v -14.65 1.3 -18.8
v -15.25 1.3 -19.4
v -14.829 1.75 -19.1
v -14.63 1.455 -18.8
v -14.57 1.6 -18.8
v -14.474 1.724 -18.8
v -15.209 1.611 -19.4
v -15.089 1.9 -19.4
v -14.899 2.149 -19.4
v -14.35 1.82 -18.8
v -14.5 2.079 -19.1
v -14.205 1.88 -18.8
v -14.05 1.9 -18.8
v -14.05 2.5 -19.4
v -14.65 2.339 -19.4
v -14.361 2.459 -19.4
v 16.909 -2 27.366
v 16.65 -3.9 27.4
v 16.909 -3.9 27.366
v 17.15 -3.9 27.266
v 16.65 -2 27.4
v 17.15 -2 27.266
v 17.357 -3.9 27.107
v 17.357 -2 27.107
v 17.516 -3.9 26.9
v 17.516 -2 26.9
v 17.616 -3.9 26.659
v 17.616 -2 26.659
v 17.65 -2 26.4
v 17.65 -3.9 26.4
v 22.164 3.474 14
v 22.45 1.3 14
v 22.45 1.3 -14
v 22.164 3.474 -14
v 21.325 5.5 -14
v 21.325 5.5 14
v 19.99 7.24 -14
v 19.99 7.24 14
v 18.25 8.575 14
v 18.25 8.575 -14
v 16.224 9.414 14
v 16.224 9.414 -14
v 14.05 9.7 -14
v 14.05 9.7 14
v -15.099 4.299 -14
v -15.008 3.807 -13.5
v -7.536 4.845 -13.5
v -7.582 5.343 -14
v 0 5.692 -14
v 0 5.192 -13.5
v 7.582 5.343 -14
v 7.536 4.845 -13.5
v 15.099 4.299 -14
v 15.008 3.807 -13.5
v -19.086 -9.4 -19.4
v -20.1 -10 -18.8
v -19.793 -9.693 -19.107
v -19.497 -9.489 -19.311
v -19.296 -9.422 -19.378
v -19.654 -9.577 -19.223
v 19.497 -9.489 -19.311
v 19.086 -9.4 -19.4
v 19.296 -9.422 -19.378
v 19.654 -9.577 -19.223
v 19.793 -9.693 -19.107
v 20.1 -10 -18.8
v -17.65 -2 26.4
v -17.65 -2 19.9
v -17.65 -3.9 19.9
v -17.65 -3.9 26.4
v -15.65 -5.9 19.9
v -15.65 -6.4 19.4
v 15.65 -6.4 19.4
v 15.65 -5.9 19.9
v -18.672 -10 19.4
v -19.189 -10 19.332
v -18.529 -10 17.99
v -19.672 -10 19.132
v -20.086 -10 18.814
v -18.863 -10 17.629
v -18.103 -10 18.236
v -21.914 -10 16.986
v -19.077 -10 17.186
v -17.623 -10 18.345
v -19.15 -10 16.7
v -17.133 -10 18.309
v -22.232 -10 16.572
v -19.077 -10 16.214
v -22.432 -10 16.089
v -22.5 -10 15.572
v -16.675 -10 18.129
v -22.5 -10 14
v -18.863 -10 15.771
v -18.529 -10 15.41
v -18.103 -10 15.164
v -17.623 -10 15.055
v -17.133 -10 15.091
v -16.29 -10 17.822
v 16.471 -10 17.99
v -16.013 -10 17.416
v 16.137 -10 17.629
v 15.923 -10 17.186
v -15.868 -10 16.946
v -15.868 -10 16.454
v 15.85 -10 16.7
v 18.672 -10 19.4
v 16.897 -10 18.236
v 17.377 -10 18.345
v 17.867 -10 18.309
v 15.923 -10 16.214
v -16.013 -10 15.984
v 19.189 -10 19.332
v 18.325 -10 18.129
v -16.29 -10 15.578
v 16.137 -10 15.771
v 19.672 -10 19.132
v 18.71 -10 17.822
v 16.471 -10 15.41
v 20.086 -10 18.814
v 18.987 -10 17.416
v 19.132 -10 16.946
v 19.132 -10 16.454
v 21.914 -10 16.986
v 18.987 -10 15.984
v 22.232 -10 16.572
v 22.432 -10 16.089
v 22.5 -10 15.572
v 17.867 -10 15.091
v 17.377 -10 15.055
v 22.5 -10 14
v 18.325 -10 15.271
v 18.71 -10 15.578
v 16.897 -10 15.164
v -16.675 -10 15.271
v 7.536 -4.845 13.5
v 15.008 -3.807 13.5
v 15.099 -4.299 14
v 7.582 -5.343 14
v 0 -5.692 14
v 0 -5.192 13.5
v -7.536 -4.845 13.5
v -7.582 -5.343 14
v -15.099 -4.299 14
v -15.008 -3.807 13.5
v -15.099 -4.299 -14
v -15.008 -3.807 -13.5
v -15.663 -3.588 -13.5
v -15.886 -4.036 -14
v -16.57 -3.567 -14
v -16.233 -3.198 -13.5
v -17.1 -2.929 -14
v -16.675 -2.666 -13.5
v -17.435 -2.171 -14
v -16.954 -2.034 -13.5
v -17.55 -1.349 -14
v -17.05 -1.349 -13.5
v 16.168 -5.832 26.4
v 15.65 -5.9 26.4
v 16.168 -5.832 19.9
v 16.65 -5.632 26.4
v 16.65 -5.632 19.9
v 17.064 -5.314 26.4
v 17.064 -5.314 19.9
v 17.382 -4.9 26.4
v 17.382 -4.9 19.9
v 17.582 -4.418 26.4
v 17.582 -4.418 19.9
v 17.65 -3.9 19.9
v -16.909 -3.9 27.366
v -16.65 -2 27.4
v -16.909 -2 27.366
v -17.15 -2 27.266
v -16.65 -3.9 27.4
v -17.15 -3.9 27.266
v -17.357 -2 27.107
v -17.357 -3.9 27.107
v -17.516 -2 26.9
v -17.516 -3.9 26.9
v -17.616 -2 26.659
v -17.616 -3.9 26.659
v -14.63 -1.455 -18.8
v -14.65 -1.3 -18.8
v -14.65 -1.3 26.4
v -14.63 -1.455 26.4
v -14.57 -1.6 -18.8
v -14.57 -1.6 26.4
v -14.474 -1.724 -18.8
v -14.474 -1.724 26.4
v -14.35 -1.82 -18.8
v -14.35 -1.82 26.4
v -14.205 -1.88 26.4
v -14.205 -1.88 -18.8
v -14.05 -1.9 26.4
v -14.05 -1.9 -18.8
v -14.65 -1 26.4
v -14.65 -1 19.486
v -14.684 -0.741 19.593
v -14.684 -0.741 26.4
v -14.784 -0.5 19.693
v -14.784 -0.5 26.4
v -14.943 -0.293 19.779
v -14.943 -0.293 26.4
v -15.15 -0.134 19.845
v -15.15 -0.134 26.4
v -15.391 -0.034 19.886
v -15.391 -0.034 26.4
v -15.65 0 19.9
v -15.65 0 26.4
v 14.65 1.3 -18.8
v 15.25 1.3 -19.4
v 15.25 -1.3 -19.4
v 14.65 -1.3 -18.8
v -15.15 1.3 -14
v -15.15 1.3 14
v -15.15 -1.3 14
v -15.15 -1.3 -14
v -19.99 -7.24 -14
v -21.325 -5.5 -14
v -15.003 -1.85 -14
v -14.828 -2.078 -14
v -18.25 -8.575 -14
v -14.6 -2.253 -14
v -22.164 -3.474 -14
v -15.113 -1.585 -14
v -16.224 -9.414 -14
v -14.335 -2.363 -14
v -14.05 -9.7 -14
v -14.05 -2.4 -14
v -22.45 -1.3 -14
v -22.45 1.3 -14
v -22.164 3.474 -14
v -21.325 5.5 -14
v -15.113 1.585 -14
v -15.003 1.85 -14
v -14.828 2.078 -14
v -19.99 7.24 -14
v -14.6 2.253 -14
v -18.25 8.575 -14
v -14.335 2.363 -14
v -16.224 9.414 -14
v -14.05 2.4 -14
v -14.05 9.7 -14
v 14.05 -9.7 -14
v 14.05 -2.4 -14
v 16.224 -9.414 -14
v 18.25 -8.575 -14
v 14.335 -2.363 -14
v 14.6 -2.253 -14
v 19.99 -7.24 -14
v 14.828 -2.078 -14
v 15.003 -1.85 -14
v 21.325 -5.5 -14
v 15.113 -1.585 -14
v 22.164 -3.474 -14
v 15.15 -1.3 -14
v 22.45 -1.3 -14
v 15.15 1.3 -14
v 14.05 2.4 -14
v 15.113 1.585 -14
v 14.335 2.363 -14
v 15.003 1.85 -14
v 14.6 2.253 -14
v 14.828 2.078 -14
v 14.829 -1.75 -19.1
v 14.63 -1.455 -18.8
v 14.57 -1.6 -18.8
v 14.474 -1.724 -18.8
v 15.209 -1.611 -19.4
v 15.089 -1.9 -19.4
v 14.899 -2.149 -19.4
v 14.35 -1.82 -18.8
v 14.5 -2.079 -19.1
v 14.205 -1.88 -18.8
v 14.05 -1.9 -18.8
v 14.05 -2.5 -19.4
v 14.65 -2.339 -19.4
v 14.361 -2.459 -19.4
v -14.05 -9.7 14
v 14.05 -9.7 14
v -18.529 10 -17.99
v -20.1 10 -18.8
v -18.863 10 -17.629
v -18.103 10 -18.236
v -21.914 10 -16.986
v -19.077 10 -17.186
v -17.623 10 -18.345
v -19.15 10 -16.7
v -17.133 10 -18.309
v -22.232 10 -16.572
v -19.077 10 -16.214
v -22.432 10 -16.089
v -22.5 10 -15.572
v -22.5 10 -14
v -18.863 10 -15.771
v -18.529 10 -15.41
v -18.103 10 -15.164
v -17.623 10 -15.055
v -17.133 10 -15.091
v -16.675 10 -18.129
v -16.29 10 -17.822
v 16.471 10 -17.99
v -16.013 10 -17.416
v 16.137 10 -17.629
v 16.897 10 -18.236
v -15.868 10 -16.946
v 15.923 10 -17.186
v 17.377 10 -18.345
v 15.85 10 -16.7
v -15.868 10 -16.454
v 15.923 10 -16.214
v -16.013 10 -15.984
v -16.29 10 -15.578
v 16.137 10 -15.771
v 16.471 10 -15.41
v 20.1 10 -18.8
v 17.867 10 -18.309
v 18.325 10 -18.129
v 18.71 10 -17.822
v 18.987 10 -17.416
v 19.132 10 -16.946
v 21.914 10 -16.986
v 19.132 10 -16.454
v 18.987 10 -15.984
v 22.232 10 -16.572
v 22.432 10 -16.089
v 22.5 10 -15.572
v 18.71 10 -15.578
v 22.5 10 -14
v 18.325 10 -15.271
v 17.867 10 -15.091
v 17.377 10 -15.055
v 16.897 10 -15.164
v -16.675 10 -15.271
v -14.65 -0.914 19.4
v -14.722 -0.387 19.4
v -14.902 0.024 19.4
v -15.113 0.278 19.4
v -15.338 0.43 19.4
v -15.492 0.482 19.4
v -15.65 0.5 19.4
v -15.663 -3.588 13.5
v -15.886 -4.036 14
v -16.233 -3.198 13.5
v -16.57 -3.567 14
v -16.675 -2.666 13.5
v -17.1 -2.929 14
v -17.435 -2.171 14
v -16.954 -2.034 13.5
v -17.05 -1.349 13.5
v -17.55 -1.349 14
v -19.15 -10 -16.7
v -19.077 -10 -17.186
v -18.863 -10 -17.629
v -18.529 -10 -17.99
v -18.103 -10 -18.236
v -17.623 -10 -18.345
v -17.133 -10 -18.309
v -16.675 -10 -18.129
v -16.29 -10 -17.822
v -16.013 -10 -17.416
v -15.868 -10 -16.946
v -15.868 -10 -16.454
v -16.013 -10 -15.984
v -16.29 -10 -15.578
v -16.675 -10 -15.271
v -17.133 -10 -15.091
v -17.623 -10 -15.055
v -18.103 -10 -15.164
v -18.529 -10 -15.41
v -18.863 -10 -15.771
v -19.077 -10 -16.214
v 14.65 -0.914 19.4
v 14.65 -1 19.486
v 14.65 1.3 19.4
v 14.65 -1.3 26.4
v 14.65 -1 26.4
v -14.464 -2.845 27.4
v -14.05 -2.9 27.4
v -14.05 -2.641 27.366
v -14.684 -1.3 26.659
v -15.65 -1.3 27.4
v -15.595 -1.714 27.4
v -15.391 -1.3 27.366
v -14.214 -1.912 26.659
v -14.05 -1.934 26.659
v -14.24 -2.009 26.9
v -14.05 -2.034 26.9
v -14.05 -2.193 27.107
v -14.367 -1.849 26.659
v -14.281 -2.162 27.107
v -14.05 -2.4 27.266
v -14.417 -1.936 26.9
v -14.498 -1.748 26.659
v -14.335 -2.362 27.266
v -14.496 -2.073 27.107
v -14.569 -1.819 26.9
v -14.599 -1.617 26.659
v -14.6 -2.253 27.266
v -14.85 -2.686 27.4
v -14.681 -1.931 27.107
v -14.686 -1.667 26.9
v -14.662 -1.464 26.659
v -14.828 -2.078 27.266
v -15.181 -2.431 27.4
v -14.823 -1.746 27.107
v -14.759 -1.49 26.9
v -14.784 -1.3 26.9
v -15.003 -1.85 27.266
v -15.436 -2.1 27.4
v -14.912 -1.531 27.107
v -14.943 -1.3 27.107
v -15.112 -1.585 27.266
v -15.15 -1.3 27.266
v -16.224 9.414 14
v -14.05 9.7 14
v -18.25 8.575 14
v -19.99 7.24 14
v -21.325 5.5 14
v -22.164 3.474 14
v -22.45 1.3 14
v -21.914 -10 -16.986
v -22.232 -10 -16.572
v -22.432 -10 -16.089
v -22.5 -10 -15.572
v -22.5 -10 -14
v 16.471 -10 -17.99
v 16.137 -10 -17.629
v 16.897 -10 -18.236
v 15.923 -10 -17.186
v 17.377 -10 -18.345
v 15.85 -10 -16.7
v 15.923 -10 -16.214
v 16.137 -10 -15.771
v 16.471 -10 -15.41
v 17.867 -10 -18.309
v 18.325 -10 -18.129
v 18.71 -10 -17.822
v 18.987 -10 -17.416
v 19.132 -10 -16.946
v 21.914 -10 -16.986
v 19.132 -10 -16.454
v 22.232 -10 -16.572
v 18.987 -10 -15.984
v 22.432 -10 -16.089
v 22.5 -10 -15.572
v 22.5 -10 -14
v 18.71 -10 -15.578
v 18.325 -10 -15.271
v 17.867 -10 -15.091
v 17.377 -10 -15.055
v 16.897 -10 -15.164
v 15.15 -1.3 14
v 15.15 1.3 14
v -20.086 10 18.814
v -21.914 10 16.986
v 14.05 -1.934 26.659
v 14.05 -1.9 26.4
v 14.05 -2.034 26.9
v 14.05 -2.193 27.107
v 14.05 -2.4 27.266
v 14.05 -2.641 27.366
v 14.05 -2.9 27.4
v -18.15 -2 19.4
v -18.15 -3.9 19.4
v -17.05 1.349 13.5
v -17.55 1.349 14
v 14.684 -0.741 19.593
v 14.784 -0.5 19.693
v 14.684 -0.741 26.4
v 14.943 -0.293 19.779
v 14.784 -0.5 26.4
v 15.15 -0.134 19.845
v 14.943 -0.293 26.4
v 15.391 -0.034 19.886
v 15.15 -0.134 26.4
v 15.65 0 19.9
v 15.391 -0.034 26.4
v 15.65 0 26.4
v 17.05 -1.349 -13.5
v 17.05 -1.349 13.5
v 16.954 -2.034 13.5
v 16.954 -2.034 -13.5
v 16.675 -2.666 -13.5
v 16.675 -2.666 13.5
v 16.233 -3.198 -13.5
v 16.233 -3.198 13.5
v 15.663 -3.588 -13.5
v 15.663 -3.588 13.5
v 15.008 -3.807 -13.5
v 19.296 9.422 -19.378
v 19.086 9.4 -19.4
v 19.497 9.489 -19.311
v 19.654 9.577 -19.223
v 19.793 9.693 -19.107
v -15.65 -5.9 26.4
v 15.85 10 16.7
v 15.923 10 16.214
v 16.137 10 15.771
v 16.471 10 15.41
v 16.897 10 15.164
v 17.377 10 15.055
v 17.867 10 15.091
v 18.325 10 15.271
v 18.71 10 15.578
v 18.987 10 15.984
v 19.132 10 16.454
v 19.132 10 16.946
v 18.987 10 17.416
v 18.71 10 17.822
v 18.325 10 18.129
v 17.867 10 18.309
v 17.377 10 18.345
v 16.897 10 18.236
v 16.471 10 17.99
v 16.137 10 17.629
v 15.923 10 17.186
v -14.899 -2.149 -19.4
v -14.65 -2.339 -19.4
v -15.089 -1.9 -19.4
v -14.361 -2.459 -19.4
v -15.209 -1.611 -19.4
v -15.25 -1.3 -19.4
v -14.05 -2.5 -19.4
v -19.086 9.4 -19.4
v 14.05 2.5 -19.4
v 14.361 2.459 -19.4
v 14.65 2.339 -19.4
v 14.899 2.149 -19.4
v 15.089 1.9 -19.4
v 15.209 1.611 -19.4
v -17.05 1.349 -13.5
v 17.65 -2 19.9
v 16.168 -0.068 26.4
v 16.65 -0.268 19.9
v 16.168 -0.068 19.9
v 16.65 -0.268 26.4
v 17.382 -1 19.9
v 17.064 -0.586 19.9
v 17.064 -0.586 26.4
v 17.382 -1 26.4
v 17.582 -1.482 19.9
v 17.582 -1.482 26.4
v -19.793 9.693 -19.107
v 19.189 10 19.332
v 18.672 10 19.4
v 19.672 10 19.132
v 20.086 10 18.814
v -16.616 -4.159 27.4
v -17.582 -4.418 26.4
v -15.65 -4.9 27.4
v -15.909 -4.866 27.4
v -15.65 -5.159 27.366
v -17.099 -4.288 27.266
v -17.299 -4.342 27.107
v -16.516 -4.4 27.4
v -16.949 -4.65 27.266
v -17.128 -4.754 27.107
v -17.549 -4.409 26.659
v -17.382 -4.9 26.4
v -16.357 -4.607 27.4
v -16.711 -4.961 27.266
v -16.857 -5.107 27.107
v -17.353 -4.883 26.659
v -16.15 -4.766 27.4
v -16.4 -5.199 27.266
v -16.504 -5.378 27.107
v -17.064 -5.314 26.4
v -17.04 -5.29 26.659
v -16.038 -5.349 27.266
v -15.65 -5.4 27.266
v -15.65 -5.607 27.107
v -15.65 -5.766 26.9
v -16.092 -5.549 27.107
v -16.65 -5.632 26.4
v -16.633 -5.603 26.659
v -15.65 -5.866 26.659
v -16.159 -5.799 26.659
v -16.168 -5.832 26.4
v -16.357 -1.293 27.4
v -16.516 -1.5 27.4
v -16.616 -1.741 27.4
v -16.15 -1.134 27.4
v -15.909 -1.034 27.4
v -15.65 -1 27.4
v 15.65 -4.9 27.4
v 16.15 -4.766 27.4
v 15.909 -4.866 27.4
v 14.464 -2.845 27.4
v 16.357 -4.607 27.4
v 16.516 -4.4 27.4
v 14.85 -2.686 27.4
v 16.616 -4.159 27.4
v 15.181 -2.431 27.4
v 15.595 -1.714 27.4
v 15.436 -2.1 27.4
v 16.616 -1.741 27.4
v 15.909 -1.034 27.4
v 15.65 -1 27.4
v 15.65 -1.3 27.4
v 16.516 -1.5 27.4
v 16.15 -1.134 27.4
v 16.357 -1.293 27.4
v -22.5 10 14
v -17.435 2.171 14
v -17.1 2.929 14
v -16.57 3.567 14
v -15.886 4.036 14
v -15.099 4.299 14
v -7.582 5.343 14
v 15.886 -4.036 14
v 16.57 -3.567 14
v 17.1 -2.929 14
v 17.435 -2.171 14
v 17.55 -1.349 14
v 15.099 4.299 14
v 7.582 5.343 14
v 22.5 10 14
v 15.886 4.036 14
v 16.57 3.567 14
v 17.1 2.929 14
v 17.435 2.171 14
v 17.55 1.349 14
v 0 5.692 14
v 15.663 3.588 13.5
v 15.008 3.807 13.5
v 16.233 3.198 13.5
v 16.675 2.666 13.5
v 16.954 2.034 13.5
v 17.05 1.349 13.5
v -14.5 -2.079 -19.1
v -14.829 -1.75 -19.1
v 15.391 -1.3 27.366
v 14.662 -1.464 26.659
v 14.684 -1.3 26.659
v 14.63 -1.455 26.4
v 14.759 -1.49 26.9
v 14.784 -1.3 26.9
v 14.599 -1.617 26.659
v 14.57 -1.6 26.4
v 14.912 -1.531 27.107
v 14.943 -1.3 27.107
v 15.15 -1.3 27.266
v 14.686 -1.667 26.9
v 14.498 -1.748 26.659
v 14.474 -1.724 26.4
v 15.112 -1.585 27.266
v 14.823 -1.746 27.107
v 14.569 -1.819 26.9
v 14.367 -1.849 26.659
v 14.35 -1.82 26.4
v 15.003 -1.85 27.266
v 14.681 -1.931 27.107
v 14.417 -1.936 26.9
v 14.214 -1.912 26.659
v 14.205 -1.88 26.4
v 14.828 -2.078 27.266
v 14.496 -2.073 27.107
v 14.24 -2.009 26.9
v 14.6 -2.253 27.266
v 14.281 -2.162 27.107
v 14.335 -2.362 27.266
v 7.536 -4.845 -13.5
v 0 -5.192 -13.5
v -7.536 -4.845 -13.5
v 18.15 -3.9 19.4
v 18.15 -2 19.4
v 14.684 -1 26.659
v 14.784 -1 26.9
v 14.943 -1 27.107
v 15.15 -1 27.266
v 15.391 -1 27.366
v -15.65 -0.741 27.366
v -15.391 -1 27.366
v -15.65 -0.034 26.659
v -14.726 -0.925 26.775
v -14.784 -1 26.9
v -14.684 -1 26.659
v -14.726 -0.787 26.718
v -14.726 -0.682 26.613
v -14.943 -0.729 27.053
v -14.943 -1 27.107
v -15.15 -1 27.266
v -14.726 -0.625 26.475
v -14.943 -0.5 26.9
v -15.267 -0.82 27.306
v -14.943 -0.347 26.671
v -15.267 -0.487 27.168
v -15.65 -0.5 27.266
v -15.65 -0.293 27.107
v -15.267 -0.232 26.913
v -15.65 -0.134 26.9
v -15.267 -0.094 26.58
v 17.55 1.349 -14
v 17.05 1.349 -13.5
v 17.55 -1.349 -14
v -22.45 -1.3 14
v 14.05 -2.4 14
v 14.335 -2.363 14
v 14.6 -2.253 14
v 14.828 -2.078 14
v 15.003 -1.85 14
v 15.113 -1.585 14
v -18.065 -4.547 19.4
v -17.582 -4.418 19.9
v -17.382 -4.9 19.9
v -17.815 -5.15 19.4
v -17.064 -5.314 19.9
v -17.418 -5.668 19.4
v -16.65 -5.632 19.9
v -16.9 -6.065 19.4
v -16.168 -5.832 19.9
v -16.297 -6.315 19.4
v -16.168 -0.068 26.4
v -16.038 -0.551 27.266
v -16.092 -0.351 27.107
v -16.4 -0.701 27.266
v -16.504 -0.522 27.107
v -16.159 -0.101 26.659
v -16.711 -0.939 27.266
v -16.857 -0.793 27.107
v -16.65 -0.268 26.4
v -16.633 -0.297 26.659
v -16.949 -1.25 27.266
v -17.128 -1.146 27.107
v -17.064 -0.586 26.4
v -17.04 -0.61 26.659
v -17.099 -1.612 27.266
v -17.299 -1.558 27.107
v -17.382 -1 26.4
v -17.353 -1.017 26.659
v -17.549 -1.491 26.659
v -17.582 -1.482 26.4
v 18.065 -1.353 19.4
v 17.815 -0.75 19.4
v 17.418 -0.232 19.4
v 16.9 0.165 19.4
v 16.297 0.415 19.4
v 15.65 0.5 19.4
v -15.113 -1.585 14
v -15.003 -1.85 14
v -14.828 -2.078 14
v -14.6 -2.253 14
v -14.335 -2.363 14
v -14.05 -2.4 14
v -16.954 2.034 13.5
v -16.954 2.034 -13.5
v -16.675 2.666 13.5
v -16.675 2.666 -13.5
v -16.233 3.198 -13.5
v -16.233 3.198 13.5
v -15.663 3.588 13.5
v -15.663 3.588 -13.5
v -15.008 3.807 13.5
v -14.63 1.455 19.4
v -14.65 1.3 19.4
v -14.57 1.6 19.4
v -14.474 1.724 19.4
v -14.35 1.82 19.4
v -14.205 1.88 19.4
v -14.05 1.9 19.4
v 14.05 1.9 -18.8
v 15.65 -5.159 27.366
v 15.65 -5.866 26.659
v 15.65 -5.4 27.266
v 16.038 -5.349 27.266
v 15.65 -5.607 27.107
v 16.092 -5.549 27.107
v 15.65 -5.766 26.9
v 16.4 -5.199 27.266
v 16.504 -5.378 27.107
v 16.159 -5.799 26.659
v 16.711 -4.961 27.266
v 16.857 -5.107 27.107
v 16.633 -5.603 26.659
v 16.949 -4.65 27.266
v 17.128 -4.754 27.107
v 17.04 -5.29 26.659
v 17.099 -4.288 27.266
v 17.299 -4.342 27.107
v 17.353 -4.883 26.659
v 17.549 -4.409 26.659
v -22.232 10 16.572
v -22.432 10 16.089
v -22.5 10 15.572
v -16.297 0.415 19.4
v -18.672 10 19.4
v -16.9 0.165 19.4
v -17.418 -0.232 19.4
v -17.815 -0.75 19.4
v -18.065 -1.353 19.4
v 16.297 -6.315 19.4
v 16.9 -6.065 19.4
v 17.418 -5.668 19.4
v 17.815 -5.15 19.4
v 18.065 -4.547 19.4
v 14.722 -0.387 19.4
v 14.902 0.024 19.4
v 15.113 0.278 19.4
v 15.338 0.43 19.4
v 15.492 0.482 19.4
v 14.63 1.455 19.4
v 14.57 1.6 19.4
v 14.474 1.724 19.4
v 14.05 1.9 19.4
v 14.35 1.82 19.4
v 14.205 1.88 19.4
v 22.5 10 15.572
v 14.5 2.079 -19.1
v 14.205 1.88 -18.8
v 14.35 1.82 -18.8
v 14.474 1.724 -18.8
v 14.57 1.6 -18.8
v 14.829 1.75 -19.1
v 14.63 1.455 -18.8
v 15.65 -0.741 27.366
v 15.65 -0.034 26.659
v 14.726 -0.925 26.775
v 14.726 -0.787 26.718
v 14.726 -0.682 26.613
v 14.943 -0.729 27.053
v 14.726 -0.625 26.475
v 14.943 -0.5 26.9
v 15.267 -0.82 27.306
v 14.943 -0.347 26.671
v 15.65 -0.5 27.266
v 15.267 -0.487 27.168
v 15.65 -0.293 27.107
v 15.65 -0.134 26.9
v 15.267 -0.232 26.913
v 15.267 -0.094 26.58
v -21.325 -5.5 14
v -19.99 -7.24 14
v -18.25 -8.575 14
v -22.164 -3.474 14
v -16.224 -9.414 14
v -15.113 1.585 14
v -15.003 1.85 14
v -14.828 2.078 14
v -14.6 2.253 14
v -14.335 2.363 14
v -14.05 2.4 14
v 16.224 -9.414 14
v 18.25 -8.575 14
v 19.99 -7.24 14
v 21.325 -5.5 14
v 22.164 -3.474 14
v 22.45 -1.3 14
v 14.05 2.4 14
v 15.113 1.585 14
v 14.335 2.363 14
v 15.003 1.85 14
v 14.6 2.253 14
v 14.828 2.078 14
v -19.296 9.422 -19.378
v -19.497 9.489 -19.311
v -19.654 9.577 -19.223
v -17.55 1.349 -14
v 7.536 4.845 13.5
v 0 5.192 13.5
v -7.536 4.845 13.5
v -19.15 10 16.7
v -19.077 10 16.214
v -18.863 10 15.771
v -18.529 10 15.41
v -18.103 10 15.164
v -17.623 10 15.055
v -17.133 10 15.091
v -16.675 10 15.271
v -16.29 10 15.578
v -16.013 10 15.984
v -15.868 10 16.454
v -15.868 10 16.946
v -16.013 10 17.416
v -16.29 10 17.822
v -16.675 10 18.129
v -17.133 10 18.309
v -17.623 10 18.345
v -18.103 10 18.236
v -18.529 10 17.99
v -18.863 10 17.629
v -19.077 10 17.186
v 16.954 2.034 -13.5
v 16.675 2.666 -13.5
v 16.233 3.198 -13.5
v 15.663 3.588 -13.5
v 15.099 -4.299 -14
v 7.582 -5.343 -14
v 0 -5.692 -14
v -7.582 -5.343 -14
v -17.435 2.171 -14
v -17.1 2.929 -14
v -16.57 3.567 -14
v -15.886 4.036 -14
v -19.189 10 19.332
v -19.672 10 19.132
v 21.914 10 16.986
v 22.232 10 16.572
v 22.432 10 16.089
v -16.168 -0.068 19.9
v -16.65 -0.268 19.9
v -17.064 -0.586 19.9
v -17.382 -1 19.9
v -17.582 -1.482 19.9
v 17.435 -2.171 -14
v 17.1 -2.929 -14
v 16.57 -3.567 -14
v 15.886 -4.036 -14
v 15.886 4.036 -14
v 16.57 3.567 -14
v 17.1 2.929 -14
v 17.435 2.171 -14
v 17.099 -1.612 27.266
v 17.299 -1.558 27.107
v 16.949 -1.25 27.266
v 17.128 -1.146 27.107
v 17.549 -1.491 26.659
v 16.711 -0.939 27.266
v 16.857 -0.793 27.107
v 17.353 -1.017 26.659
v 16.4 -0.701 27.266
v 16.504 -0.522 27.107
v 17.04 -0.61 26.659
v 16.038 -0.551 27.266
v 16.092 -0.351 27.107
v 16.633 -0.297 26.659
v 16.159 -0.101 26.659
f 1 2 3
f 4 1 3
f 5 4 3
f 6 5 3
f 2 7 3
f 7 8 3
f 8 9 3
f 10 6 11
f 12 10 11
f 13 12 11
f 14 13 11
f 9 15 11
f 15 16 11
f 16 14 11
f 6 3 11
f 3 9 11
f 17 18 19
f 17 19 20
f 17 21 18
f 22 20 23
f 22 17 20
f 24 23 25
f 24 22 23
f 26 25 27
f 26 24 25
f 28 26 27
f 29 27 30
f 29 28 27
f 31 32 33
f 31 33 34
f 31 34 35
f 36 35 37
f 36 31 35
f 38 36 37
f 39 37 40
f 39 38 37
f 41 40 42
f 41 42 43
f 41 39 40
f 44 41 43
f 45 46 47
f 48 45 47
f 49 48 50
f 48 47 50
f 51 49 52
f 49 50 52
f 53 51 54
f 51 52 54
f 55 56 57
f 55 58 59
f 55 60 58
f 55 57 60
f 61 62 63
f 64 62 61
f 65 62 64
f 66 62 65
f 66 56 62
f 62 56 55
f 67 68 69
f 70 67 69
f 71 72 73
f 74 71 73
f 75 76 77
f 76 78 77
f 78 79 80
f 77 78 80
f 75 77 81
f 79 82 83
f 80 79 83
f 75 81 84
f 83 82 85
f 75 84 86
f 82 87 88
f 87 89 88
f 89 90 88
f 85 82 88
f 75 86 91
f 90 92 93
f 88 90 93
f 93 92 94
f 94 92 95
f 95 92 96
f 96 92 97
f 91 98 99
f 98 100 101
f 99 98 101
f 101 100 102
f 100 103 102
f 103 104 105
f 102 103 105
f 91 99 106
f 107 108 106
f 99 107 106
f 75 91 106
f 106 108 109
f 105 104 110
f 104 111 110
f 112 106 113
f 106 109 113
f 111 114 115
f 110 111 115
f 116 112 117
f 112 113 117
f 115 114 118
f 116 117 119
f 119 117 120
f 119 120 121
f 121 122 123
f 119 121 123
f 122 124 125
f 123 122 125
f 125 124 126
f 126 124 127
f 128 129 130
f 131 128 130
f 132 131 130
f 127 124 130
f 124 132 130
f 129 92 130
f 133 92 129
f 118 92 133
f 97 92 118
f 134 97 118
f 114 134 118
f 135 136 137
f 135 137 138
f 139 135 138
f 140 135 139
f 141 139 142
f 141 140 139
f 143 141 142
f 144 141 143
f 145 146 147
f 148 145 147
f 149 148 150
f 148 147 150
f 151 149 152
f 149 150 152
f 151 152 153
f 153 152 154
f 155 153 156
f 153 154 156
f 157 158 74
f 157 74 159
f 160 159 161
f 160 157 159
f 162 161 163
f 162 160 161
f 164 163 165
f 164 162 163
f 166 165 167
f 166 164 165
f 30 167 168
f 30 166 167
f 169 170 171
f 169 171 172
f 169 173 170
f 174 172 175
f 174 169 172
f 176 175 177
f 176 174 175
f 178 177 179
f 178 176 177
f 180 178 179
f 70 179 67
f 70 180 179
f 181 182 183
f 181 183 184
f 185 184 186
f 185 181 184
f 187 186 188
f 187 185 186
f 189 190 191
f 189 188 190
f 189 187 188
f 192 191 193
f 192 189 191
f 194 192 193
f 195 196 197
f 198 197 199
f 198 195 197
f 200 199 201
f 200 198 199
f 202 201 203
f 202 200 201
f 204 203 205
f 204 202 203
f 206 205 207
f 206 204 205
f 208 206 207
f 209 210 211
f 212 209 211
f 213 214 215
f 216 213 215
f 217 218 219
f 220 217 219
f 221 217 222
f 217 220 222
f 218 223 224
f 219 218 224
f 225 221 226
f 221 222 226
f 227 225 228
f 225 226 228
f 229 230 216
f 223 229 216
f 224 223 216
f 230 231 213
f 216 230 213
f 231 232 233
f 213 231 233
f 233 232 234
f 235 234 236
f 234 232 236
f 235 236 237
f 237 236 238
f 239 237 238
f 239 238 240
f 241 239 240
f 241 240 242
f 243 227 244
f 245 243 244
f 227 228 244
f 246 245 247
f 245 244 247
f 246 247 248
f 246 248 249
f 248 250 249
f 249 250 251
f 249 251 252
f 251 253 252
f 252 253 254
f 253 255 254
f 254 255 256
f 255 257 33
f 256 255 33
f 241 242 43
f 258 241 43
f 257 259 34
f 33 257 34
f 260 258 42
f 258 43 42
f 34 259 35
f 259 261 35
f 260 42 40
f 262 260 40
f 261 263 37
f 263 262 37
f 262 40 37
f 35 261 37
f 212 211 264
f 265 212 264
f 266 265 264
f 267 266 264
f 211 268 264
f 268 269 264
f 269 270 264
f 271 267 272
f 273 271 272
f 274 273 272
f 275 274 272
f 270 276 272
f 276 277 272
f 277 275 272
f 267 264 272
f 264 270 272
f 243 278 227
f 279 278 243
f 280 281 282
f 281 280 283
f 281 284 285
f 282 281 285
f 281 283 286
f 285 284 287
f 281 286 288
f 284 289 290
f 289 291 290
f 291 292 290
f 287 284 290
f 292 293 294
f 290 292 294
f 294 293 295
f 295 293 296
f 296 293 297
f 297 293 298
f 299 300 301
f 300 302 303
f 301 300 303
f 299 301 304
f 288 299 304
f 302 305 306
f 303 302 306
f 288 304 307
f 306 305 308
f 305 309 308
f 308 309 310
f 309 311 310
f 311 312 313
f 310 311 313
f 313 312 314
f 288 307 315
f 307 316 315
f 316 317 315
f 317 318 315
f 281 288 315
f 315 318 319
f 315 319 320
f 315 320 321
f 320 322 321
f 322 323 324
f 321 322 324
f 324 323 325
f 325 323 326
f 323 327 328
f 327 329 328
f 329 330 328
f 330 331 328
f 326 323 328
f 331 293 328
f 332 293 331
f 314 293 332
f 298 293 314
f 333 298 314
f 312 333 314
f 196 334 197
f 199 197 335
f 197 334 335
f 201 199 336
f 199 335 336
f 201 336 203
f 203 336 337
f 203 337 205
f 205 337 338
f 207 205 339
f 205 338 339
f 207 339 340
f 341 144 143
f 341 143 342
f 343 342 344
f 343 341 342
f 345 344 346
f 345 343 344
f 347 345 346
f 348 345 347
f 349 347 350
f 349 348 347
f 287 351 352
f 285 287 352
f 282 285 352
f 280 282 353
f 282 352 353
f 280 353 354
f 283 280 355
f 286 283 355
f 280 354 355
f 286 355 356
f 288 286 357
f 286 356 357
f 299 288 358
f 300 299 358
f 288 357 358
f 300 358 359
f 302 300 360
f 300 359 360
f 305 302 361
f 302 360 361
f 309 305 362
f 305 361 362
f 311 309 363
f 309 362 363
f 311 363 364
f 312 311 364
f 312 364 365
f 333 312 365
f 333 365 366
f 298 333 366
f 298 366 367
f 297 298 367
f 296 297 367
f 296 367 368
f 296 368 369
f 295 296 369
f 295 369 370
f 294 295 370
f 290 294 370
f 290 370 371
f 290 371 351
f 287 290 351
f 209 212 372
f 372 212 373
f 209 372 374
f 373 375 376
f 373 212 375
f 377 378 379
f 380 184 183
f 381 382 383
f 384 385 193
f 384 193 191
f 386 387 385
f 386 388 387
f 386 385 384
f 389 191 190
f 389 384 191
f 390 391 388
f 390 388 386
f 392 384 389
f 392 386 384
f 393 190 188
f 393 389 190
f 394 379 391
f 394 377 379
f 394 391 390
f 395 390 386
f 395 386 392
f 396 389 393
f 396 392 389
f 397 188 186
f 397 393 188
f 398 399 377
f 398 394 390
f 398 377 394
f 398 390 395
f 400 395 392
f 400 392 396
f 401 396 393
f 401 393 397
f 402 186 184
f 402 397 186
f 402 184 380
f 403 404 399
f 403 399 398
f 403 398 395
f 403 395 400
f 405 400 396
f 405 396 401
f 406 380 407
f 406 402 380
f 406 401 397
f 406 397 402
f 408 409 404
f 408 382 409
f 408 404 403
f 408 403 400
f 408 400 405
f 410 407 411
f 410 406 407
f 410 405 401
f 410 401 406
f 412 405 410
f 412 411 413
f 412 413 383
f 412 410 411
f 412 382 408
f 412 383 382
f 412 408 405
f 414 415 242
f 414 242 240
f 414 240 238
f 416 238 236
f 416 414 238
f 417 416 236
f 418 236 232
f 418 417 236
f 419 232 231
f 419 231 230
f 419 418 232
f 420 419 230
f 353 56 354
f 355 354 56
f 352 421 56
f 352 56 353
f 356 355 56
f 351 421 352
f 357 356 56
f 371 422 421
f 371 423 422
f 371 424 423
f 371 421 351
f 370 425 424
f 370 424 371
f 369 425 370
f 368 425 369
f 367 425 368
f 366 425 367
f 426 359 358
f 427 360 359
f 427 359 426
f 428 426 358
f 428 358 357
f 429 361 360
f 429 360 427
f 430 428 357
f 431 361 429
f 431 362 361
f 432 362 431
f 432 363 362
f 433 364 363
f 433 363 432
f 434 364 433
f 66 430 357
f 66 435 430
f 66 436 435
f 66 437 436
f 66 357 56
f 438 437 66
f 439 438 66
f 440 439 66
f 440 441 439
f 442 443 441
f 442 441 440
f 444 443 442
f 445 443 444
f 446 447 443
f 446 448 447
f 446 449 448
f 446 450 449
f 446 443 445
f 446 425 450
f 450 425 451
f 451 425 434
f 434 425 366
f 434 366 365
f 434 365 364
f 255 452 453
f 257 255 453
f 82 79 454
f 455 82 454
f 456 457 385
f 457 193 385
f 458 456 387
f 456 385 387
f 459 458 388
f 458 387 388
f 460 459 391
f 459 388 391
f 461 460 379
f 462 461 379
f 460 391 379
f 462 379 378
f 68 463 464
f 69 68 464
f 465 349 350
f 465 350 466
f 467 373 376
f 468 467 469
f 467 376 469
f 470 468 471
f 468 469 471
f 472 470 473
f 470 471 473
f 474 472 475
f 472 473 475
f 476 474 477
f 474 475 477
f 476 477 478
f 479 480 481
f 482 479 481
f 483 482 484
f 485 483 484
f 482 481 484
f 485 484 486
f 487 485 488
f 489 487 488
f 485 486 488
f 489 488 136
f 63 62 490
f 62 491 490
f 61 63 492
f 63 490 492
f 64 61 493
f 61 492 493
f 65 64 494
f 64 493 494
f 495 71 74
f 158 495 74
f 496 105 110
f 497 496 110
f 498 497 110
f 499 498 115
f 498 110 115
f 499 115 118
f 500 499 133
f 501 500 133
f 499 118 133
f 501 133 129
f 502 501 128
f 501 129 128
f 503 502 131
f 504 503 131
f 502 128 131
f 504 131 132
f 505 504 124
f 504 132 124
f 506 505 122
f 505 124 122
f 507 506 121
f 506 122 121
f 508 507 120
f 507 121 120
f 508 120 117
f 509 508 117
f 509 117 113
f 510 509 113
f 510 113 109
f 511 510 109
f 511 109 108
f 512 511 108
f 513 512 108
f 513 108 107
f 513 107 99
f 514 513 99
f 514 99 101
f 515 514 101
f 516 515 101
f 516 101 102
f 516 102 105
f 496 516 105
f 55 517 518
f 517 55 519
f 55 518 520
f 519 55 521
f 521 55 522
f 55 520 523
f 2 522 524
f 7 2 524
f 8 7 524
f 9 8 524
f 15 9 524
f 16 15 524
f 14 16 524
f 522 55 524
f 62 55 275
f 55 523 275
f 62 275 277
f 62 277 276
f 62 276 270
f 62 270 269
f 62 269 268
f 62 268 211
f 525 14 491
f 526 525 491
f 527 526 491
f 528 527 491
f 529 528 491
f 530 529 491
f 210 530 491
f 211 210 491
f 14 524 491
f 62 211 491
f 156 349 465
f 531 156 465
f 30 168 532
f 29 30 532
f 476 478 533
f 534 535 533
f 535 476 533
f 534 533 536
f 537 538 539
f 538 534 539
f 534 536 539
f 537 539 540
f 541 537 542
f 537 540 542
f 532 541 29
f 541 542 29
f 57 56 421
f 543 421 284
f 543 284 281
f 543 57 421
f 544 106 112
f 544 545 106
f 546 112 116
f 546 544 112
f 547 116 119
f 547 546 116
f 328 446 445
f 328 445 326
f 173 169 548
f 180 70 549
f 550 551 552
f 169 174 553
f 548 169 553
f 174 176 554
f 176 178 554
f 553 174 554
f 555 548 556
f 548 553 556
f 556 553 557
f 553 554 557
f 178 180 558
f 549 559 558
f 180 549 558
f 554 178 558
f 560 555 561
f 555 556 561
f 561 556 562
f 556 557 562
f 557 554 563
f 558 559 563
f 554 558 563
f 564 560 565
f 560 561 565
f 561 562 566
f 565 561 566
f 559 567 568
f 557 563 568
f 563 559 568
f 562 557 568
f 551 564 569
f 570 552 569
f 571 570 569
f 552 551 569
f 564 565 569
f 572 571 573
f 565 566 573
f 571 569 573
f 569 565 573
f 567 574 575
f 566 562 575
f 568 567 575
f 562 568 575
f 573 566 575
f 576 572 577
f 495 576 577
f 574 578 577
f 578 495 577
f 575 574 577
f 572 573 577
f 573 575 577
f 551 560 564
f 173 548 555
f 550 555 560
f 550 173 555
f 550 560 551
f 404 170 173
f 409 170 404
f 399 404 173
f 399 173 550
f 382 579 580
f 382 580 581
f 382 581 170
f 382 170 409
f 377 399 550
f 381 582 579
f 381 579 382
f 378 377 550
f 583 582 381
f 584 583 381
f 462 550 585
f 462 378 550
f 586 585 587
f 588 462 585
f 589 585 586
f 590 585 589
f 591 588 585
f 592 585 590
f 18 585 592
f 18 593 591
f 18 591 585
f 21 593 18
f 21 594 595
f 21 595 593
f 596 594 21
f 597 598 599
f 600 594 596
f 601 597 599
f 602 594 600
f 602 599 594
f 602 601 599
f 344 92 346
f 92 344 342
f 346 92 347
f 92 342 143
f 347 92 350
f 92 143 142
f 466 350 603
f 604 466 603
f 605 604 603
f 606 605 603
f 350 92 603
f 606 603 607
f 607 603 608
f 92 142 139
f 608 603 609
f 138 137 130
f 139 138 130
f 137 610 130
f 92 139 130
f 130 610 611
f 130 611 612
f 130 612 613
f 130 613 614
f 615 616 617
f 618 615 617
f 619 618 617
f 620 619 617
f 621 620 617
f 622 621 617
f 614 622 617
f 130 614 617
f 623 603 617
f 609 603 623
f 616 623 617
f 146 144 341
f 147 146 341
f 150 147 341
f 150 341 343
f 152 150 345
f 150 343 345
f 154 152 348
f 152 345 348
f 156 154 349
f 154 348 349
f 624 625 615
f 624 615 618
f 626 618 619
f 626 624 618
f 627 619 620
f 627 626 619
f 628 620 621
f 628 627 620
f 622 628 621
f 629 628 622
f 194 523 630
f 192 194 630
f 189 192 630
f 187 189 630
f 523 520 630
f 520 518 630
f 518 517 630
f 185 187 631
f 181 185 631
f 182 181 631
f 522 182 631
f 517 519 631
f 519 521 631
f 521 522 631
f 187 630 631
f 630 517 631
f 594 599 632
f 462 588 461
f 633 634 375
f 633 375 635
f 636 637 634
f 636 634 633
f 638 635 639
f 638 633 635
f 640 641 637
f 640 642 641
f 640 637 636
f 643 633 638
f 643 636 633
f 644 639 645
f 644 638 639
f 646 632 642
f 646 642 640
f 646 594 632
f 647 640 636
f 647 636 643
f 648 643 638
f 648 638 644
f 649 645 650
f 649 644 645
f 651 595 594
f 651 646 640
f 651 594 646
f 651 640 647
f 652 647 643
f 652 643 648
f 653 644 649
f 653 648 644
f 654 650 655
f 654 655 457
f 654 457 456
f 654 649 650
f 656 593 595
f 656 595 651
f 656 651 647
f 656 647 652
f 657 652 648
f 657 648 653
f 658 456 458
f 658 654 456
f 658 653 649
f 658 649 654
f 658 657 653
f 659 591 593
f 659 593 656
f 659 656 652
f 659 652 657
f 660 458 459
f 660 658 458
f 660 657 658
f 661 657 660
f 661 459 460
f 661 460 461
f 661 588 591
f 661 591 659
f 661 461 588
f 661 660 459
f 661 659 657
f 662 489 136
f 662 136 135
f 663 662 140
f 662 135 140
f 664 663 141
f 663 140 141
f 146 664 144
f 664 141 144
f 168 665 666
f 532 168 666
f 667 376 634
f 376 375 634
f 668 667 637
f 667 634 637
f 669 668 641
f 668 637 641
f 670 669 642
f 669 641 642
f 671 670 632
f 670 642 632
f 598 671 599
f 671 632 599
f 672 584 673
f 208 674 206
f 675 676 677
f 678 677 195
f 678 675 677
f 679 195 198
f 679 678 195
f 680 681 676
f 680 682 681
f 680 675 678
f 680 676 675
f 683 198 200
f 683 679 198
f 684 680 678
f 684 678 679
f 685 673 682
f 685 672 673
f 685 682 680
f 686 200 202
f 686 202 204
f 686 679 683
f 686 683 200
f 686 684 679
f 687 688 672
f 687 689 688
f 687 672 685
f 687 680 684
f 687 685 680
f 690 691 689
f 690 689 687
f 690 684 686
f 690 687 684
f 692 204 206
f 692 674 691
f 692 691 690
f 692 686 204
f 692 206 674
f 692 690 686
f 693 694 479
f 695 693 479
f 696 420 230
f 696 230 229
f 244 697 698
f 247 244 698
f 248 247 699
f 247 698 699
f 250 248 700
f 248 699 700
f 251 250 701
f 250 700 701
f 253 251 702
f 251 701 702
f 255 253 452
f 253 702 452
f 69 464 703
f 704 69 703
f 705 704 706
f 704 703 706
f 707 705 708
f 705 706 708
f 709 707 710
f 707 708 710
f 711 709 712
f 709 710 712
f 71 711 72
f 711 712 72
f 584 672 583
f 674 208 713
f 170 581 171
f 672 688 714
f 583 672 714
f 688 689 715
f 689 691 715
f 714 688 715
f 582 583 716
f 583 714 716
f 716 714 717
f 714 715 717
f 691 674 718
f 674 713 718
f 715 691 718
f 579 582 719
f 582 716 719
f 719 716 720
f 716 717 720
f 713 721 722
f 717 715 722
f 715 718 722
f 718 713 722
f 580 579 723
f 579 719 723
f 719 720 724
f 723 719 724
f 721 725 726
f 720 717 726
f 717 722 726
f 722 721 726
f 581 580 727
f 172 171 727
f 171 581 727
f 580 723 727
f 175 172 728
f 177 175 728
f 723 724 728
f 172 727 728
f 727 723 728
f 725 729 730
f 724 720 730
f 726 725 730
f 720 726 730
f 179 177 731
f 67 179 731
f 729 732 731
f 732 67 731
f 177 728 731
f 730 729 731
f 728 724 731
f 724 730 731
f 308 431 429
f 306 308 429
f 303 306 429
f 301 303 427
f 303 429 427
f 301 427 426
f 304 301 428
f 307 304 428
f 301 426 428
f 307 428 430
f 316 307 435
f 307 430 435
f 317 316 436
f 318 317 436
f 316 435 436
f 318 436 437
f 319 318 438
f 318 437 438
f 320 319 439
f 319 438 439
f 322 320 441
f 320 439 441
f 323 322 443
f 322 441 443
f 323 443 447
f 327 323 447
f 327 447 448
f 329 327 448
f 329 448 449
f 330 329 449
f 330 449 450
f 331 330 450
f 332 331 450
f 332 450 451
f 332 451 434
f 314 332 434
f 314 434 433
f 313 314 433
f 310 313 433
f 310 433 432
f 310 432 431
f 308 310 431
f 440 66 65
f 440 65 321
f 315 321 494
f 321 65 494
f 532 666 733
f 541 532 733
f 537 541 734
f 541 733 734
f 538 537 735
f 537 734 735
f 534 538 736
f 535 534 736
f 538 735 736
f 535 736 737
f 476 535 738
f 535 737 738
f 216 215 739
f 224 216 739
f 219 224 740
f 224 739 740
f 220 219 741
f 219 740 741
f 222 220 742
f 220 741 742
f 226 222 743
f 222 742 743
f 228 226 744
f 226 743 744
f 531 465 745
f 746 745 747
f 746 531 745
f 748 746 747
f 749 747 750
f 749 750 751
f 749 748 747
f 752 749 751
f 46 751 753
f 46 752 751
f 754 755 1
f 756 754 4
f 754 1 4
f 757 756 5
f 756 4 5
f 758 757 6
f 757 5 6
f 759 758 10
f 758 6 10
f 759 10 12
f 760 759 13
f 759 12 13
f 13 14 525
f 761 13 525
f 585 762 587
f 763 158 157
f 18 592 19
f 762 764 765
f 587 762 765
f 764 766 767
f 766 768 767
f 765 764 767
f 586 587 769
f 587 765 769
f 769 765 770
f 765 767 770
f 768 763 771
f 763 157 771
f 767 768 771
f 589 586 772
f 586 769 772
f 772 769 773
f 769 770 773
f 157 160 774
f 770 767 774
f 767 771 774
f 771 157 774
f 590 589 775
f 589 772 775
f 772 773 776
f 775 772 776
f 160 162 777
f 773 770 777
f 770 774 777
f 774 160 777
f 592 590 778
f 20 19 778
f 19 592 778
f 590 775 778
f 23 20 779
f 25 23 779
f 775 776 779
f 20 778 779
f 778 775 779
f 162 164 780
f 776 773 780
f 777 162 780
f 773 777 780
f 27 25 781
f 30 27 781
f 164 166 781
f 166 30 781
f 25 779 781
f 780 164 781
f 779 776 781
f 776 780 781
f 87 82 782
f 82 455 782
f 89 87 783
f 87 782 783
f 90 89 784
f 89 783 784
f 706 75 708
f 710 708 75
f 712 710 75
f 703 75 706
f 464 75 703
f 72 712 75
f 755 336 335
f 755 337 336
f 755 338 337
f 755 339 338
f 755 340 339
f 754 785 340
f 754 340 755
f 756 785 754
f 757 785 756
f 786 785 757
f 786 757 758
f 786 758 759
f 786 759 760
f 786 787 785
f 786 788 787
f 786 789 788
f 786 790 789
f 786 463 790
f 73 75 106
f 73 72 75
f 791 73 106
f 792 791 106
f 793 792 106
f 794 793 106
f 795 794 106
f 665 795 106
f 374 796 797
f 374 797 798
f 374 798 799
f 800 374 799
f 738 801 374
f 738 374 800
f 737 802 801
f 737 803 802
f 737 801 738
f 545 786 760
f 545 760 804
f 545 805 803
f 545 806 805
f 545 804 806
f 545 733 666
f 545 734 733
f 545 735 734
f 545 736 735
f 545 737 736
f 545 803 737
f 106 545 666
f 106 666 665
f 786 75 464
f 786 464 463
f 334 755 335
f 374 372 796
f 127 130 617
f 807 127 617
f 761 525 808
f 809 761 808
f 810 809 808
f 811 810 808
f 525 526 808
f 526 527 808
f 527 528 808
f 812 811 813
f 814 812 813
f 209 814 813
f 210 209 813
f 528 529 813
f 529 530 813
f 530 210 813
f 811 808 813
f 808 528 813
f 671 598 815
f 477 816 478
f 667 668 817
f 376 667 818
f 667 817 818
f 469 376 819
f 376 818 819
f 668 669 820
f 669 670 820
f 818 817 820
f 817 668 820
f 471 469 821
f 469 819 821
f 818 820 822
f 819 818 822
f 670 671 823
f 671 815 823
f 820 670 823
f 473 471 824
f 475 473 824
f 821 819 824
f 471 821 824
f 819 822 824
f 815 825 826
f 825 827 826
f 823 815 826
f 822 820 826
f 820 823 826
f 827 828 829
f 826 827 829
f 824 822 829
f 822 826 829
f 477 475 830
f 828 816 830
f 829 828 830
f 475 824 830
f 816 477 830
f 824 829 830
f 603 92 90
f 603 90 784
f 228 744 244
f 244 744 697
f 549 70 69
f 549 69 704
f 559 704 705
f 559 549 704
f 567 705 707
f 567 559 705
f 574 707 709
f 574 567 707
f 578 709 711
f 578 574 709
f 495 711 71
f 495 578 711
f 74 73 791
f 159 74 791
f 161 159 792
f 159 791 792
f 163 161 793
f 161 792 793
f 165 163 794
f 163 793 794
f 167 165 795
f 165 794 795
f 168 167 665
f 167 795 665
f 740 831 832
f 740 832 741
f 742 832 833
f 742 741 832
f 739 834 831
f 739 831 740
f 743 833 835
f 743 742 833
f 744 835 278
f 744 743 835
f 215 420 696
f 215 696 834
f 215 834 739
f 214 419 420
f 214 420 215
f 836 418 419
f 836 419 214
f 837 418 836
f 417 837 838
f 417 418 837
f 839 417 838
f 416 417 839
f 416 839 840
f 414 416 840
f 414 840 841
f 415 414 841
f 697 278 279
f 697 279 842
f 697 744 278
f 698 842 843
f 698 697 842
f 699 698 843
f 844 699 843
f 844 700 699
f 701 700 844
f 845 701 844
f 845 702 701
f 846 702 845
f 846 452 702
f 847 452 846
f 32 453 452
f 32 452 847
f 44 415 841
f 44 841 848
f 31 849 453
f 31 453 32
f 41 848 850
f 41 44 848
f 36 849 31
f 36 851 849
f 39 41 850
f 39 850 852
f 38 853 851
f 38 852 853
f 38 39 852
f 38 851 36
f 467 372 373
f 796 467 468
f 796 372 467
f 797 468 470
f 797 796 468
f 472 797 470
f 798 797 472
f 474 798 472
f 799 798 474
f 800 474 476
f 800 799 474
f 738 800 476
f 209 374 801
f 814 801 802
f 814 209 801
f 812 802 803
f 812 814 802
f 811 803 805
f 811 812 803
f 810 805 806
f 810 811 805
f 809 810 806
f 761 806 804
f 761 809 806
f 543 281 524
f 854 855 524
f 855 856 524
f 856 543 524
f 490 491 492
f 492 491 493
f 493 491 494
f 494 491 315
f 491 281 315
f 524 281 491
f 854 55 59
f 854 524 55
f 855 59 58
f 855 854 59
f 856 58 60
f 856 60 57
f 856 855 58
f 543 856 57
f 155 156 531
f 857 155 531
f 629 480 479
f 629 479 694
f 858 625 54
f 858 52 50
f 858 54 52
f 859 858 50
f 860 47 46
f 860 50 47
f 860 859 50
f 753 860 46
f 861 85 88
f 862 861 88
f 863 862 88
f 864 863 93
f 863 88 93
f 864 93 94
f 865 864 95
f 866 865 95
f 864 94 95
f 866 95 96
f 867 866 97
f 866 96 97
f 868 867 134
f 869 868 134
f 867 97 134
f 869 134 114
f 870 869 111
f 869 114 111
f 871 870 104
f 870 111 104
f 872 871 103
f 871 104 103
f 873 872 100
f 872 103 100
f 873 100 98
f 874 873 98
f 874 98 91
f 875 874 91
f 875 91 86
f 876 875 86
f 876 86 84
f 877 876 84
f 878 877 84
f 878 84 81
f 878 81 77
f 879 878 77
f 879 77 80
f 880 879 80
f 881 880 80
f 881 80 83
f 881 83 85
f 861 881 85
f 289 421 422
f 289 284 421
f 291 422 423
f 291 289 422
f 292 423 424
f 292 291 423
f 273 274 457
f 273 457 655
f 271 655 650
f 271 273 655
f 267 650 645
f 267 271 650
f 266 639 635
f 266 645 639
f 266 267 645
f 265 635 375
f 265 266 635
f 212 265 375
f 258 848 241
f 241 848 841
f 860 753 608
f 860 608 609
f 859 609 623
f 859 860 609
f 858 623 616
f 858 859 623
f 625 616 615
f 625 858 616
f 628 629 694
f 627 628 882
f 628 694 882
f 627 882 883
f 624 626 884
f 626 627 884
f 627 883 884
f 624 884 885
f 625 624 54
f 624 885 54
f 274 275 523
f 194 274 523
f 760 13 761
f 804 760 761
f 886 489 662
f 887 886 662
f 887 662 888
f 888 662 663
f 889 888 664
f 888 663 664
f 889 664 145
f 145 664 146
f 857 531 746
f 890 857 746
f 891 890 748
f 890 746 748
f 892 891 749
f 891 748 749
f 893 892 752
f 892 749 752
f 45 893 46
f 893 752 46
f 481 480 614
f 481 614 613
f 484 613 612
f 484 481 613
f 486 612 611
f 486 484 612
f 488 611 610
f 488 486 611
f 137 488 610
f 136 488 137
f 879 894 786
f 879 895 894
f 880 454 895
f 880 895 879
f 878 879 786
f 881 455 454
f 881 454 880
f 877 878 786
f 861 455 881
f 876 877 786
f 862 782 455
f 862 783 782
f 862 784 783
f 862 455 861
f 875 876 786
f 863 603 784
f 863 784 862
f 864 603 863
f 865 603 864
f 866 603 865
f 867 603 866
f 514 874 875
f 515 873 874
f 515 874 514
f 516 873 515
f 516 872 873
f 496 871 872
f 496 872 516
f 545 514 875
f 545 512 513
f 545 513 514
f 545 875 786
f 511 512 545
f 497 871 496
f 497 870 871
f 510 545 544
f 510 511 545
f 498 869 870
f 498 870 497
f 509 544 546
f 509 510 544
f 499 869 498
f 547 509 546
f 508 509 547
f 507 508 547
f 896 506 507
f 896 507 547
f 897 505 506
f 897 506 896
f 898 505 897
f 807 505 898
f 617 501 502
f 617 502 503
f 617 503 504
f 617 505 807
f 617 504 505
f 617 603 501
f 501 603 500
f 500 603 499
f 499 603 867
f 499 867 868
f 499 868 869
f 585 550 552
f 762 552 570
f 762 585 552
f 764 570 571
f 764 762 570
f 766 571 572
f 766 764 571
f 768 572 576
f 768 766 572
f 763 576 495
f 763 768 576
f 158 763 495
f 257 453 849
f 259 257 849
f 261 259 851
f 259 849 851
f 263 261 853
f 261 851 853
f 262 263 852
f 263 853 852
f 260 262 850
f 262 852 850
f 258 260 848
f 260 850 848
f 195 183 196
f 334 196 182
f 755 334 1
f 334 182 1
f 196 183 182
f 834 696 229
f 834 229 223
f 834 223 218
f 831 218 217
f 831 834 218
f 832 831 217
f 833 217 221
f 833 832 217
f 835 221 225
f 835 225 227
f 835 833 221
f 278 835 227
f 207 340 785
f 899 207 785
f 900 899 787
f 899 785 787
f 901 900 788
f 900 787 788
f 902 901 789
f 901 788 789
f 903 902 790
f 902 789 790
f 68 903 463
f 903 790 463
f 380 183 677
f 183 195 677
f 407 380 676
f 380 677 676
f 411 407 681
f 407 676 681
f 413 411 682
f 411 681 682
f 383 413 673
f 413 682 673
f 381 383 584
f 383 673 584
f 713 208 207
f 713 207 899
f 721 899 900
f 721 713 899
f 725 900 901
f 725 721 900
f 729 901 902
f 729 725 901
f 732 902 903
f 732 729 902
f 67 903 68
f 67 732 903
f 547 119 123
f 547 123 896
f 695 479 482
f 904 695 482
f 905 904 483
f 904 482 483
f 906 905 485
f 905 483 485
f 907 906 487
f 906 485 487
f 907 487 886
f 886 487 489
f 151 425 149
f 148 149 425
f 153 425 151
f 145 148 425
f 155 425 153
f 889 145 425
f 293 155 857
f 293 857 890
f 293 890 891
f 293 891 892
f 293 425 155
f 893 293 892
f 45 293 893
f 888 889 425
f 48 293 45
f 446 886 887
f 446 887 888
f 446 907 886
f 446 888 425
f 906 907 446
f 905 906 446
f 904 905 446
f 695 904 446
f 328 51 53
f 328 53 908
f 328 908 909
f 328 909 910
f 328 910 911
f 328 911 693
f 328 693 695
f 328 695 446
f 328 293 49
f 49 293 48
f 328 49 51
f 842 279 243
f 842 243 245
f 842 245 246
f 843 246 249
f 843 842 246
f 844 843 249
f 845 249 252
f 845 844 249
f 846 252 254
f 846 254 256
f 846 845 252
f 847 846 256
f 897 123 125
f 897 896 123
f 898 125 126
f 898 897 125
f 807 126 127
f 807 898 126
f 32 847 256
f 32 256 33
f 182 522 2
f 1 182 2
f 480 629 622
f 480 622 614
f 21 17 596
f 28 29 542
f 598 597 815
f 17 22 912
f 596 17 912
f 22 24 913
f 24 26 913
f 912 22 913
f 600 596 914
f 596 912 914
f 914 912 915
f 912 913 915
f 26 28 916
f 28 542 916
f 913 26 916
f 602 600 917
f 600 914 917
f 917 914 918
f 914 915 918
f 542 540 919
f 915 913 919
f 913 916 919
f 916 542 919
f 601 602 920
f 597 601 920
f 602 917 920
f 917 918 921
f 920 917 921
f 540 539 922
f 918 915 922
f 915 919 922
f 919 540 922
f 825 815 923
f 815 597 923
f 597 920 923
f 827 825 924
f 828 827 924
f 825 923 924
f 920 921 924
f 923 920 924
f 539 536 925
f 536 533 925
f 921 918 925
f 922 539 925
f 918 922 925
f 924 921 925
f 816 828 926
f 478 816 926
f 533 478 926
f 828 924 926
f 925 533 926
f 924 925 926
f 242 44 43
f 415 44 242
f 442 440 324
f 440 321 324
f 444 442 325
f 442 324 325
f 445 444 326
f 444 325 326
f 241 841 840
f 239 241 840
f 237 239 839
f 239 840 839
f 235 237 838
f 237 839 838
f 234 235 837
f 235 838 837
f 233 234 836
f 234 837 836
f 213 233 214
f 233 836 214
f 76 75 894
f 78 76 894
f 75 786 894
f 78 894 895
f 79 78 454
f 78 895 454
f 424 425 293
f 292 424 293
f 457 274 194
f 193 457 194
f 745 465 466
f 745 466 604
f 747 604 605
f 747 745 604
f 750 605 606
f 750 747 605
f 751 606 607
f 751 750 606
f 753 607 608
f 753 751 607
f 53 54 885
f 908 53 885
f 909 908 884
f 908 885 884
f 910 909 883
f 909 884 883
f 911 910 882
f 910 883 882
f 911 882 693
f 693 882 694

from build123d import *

# Parameters (mm, degrees)
SKETCH1_W             = 34.1
SKETCH1_H             = 6.8
SKETCH1_W_2           = 29.3
SKETCH1_H_2           = 3.8
CENTER_TUBE_DEPTH     = 14
CURVATURE_DEPTH       = 28
SKETCH2_W             = 45
SKETCH2_H             = 20
SKETCH2_W_2           = 29.3
SKETCH2_H_2           = 3.8
FLANGE_DEPTH          = 5.4
M3_CLEARANCE_HOLE1_D  = 3.3
BOSS_EXTRUDE3_DEPTH   = 8
FILLET_CENTER_EDGES_R = 2.5
CHAMFER1_SIZE         = 3
FILLET4_R             = 2
FILLET6_R             = 0.6
CHAMFER2_SIZE         = 0.5
FILLET7_R             = 2
BOSS_EXTRUDE4_DEPTH   = 28
CHAMFER3_SIZE         = 0.6
FILLET8_R             = 1


with BuildPart() as part:
    # Sketch1 → Center Tube (new, symmetric)
    with BuildSketch(Plane.XY):
        Rectangle(SKETCH1_W, SKETCH1_H)
        Rectangle(SKETCH1_W_2, SKETCH1_H_2, mode=Mode.SUBTRACT)
    extrude(amount=CENTER_TUBE_DEPTH, both=True)

    # Sketch55 → Curvature (add)
    with BuildSketch(Plane.XY.offset(14)):
        with BuildLine():
            Line((-17.05, 3.4), (17.05, 3.4))
            ThreePointArc((17.05, 3.4), (0, 5.192160608), (-17.05, 3.4))
        make_face()
        with BuildLine():
            Line((-17.05, -3.4), (17.05, -3.4))
            ThreePointArc((17.05, -3.4), (0, -5.192160608), (-17.05, -3.4))
        make_face()
    extrude(amount=-CURVATURE_DEPTH)

    # Sketch2 → Flange (add)
    with BuildSketch(Plane.XY.offset(14)):
        Rectangle(SKETCH2_W, SKETCH2_H)
        Rectangle(SKETCH2_W_2, SKETCH2_H_2, mode=Mode.SUBTRACT)
    flange = extrude(amount=FLANGE_DEPTH)

    # Mirror1: Flange across plane
    add(flange.mirror(Plane.XY))

    # M3 Clearance Hole1 (through all)
    with Locations(Plane(origin=(0, 10, 0), x_dir=(1, 0, 0), z_dir=(0, 1, 0))):
        with Locations((-17.5, -16.7), (-17.5, 16.7), (17.5, 16.7), (17.5, -16.7)):
            Hole(M3_CLEARANCE_HOLE1_D / 2)

    # Sketch14 → Boss-Extrude3 (add)
    with BuildSketch(Plane.XY.offset(19.4)):
        Polygon((-14.65, 0), (-17.65, 0), (-17.65, -5.9), (17.65, -5.9), (17.65, 0), (14.65, 0), (14.65, -1.9), (-14.65, -1.9), align=None)
    extrude(amount=BOSS_EXTRUDE3_DEPTH)

    # Fillet Center Edges
    fillet_center_edges_edges = [part.edges().sort_by_distance(p)[0] for p in [
        (17.05, -3.4, 0),
        (-17.05, -3.4, 0),
        (-17.05, 3.4, 0),
        (17.05, 3.4, 0),
    ]]
    fillet(fillet_center_edges_edges, radius=FILLET_CENTER_EDGES_R)

    # Chamfer1
    chamfer1_edges = [part.edges().sort_by_distance(p)[0] for p in [
        (-22.5, 0, 19.4),
        (22.5, 0, 19.4),
        (-22.5, 0, -19.4),
        (22.5, 0, -19.4),
    ]]
    chamfer(chamfer1_edges, length=CHAMFER1_SIZE)

    # Fillet4
    fillet4_edges = [part.edges().sort_by_distance(p)[0] for p in [
        (-17.65, 0, 23.4),
        (-17.65, -5.9, 23.4),
        (17.65, -5.9, 23.4),
        (17.65, 0, 23.4),
    ]]
    fillet(fillet4_edges, radius=FILLET4_R)

    # Fillet6
    fillet6_edges = [part.edges().sort_by_distance(p)[0] for p in [
        (14.65, -1.9, 4),
        (14.65, 1.9, 0),
        (-14.65, 1.9, 0),
        (-14.65, -1.9, 4),
    ]]
    fillet(fillet6_edges, radius=FILLET6_R)

    # Chamfer2
    chamfer2_edges = [part.edges().sort_by_distance(p)[0] for p in [
        (-15.15, 0, 19.4),
        (0, -5.192160608, -14),
        (0, -5.192160608, 14),
        (-17.05, 0, -14),
        (-17.05, 0, 14),
        (0, 5.192160608, -14),
        (0, 5.192160608, 14),
        (17.05, 0, -14),
        (17.05, 0, 14),
        (-16.472741262, -2.94718964, -14),
        (-16.472741262, -2.94718964, 14),
        (16.472741262, 2.94718964, -14),
        (16.472741262, 2.94718964, 14),
        (16.472741262, -2.94718964, -14),
        (16.472741262, -2.94718964, 14),
        (-16.472741262, 2.94718964, -14),
        (-16.472741262, 2.94718964, 14),
        (17.65, -2.95, 19.4),
        (0, -5.9, 19.4),
        (-17.65, -2.95, 19.4),
        (15.15, 0, 19.4),
        (17.064213562, -5.314213562, 19.4),
        (-17.064213562, -5.314213562, 19.4),
        (17.064213562, -0.585786438, 19.4),
        (-17.064213562, -0.585786438, 19.4),
    ]]
    chamfer(chamfer2_edges, length=CHAMFER2_SIZE)

    # Fillet7
    fillet7_edges = [part.edges().sort_by_distance(p)[0] for p in [
        (-22.5, 0, -16.4),
        (22.5, 0, -16.4),
        (-19.5, 0, 19.4),
        (19.5, 0, 19.4),
        (22.5, 0, 16.4),
        (-22.5, 0, 16.4),
    ]]
    fillet(fillet7_edges, radius=FILLET7_R)

    # Chamfer3
    chamfer3_edges = [part.edges().sort_by_distance(p)[0] for p in [
        (0, -10, -19.4),
        (0, 10, -19.4),
        (0, 1.9, -19.4),
        (-14.65, 0, -19.4),
        (14.65, 0, -19.4),
        (0, -1.9, -19.4),
        (-14.474264069, 1.724264069, -19.4),
        (14.474264069, 1.724264069, -19.4),
        (14.474264069, -1.724264069, -19.4),
        (-14.474264069, -1.724264069, -19.4),
    ]]
    chamfer(chamfer3_edges, length=CHAMFER3_SIZE)

    # Fillet8
    fillet8_edges = [part.edges().sort_by_distance(p)[0] for p in [
        (-19.5, 0, -19.4),
        (19.5, 0, -19.4),
        (-17.064213562, -5.314213562, 27.4),
        (-17.65, -2.95, 27.4),
        (-17.064213562, -0.585786438, 27.4),
        (-14.65, -0.65, 27.4),
        (-14.474264069, -1.724264069, 27.4),
        (0, -1.9, 27.4),
        (14.474264069, -1.724264069, 27.4),
        (14.65, -0.65, 27.4),
        (17.064213562, -0.585786438, 27.4),
        (17.65, -2.95, 27.4),
        (17.064213562, -5.314213562, 27.4),
        (0, -5.9, 27.4),
        (14.65, 0, 23.65),
        (-14.65, 0, 23.65),
        (14.65, 0.25, 19.65),
        (-14.65, 0.25, 19.65),
    ]]
    fillet(fillet8_edges, radius=FILLET8_R - 0.0001)  # a hair under: the kernel refuses the full size


with BuildPart() as body_2:
    # Sketch54 → Boss-Extrude4 (new body)
    with BuildSketch(Plane(origin=(0, 0, 14), x_dir=(-1, 0, 0), z_dir=(0, 0, -1))):
        with BuildLine():
            Line((22.45, 1.3), (22.45, -1.3))
            ThreePointArc((22.45, -1.3), (19.989696962, -7.239696962), (14.05, -9.7))
            Line((14.05, -9.7), (-14.05, -9.7))
            ThreePointArc((-14.05, -9.7), (-19.989696962, -7.239696962), (-22.45, -1.3))
            Line((-22.45, -1.3), (-22.45, 1.3))
            ThreePointArc((-22.45, 1.3), (-19.989696962, 7.239696962), (-14.05, 9.7))
            Line((-14.05, 9.7), (14.05, 9.7))
            ThreePointArc((14.05, 9.7), (19.989696962, 7.239696962), (22.45, 1.3))
        make_face()
        with BuildLine():
            Line((15.15, 1.3), (15.15, -1.3))
            ThreePointArc((15.15, -1.3), (14.827817459, -2.077817459), (14.05, -2.4))
            Line((14.05, -2.4), (-14.05, -2.4))
            ThreePointArc((-14.05, -2.4), (-14.827817459, -2.077817459), (-15.15, -1.3))
            Line((-15.15, -1.3), (-15.15, 1.3))
            ThreePointArc((-15.15, 1.3), (-14.827817459, 2.077817459), (-14.05, 2.4))
            Line((-14.05, 2.4), (14.05, 2.4))
            ThreePointArc((14.05, 2.4), (14.827817459, 2.077817459), (15.15, 1.3))
        make_face(mode=Mode.SUBTRACT)
    extrude(amount=BOSS_EXTRUDE4_DEPTH)


solid = Compound([part.part, body_2.part])
